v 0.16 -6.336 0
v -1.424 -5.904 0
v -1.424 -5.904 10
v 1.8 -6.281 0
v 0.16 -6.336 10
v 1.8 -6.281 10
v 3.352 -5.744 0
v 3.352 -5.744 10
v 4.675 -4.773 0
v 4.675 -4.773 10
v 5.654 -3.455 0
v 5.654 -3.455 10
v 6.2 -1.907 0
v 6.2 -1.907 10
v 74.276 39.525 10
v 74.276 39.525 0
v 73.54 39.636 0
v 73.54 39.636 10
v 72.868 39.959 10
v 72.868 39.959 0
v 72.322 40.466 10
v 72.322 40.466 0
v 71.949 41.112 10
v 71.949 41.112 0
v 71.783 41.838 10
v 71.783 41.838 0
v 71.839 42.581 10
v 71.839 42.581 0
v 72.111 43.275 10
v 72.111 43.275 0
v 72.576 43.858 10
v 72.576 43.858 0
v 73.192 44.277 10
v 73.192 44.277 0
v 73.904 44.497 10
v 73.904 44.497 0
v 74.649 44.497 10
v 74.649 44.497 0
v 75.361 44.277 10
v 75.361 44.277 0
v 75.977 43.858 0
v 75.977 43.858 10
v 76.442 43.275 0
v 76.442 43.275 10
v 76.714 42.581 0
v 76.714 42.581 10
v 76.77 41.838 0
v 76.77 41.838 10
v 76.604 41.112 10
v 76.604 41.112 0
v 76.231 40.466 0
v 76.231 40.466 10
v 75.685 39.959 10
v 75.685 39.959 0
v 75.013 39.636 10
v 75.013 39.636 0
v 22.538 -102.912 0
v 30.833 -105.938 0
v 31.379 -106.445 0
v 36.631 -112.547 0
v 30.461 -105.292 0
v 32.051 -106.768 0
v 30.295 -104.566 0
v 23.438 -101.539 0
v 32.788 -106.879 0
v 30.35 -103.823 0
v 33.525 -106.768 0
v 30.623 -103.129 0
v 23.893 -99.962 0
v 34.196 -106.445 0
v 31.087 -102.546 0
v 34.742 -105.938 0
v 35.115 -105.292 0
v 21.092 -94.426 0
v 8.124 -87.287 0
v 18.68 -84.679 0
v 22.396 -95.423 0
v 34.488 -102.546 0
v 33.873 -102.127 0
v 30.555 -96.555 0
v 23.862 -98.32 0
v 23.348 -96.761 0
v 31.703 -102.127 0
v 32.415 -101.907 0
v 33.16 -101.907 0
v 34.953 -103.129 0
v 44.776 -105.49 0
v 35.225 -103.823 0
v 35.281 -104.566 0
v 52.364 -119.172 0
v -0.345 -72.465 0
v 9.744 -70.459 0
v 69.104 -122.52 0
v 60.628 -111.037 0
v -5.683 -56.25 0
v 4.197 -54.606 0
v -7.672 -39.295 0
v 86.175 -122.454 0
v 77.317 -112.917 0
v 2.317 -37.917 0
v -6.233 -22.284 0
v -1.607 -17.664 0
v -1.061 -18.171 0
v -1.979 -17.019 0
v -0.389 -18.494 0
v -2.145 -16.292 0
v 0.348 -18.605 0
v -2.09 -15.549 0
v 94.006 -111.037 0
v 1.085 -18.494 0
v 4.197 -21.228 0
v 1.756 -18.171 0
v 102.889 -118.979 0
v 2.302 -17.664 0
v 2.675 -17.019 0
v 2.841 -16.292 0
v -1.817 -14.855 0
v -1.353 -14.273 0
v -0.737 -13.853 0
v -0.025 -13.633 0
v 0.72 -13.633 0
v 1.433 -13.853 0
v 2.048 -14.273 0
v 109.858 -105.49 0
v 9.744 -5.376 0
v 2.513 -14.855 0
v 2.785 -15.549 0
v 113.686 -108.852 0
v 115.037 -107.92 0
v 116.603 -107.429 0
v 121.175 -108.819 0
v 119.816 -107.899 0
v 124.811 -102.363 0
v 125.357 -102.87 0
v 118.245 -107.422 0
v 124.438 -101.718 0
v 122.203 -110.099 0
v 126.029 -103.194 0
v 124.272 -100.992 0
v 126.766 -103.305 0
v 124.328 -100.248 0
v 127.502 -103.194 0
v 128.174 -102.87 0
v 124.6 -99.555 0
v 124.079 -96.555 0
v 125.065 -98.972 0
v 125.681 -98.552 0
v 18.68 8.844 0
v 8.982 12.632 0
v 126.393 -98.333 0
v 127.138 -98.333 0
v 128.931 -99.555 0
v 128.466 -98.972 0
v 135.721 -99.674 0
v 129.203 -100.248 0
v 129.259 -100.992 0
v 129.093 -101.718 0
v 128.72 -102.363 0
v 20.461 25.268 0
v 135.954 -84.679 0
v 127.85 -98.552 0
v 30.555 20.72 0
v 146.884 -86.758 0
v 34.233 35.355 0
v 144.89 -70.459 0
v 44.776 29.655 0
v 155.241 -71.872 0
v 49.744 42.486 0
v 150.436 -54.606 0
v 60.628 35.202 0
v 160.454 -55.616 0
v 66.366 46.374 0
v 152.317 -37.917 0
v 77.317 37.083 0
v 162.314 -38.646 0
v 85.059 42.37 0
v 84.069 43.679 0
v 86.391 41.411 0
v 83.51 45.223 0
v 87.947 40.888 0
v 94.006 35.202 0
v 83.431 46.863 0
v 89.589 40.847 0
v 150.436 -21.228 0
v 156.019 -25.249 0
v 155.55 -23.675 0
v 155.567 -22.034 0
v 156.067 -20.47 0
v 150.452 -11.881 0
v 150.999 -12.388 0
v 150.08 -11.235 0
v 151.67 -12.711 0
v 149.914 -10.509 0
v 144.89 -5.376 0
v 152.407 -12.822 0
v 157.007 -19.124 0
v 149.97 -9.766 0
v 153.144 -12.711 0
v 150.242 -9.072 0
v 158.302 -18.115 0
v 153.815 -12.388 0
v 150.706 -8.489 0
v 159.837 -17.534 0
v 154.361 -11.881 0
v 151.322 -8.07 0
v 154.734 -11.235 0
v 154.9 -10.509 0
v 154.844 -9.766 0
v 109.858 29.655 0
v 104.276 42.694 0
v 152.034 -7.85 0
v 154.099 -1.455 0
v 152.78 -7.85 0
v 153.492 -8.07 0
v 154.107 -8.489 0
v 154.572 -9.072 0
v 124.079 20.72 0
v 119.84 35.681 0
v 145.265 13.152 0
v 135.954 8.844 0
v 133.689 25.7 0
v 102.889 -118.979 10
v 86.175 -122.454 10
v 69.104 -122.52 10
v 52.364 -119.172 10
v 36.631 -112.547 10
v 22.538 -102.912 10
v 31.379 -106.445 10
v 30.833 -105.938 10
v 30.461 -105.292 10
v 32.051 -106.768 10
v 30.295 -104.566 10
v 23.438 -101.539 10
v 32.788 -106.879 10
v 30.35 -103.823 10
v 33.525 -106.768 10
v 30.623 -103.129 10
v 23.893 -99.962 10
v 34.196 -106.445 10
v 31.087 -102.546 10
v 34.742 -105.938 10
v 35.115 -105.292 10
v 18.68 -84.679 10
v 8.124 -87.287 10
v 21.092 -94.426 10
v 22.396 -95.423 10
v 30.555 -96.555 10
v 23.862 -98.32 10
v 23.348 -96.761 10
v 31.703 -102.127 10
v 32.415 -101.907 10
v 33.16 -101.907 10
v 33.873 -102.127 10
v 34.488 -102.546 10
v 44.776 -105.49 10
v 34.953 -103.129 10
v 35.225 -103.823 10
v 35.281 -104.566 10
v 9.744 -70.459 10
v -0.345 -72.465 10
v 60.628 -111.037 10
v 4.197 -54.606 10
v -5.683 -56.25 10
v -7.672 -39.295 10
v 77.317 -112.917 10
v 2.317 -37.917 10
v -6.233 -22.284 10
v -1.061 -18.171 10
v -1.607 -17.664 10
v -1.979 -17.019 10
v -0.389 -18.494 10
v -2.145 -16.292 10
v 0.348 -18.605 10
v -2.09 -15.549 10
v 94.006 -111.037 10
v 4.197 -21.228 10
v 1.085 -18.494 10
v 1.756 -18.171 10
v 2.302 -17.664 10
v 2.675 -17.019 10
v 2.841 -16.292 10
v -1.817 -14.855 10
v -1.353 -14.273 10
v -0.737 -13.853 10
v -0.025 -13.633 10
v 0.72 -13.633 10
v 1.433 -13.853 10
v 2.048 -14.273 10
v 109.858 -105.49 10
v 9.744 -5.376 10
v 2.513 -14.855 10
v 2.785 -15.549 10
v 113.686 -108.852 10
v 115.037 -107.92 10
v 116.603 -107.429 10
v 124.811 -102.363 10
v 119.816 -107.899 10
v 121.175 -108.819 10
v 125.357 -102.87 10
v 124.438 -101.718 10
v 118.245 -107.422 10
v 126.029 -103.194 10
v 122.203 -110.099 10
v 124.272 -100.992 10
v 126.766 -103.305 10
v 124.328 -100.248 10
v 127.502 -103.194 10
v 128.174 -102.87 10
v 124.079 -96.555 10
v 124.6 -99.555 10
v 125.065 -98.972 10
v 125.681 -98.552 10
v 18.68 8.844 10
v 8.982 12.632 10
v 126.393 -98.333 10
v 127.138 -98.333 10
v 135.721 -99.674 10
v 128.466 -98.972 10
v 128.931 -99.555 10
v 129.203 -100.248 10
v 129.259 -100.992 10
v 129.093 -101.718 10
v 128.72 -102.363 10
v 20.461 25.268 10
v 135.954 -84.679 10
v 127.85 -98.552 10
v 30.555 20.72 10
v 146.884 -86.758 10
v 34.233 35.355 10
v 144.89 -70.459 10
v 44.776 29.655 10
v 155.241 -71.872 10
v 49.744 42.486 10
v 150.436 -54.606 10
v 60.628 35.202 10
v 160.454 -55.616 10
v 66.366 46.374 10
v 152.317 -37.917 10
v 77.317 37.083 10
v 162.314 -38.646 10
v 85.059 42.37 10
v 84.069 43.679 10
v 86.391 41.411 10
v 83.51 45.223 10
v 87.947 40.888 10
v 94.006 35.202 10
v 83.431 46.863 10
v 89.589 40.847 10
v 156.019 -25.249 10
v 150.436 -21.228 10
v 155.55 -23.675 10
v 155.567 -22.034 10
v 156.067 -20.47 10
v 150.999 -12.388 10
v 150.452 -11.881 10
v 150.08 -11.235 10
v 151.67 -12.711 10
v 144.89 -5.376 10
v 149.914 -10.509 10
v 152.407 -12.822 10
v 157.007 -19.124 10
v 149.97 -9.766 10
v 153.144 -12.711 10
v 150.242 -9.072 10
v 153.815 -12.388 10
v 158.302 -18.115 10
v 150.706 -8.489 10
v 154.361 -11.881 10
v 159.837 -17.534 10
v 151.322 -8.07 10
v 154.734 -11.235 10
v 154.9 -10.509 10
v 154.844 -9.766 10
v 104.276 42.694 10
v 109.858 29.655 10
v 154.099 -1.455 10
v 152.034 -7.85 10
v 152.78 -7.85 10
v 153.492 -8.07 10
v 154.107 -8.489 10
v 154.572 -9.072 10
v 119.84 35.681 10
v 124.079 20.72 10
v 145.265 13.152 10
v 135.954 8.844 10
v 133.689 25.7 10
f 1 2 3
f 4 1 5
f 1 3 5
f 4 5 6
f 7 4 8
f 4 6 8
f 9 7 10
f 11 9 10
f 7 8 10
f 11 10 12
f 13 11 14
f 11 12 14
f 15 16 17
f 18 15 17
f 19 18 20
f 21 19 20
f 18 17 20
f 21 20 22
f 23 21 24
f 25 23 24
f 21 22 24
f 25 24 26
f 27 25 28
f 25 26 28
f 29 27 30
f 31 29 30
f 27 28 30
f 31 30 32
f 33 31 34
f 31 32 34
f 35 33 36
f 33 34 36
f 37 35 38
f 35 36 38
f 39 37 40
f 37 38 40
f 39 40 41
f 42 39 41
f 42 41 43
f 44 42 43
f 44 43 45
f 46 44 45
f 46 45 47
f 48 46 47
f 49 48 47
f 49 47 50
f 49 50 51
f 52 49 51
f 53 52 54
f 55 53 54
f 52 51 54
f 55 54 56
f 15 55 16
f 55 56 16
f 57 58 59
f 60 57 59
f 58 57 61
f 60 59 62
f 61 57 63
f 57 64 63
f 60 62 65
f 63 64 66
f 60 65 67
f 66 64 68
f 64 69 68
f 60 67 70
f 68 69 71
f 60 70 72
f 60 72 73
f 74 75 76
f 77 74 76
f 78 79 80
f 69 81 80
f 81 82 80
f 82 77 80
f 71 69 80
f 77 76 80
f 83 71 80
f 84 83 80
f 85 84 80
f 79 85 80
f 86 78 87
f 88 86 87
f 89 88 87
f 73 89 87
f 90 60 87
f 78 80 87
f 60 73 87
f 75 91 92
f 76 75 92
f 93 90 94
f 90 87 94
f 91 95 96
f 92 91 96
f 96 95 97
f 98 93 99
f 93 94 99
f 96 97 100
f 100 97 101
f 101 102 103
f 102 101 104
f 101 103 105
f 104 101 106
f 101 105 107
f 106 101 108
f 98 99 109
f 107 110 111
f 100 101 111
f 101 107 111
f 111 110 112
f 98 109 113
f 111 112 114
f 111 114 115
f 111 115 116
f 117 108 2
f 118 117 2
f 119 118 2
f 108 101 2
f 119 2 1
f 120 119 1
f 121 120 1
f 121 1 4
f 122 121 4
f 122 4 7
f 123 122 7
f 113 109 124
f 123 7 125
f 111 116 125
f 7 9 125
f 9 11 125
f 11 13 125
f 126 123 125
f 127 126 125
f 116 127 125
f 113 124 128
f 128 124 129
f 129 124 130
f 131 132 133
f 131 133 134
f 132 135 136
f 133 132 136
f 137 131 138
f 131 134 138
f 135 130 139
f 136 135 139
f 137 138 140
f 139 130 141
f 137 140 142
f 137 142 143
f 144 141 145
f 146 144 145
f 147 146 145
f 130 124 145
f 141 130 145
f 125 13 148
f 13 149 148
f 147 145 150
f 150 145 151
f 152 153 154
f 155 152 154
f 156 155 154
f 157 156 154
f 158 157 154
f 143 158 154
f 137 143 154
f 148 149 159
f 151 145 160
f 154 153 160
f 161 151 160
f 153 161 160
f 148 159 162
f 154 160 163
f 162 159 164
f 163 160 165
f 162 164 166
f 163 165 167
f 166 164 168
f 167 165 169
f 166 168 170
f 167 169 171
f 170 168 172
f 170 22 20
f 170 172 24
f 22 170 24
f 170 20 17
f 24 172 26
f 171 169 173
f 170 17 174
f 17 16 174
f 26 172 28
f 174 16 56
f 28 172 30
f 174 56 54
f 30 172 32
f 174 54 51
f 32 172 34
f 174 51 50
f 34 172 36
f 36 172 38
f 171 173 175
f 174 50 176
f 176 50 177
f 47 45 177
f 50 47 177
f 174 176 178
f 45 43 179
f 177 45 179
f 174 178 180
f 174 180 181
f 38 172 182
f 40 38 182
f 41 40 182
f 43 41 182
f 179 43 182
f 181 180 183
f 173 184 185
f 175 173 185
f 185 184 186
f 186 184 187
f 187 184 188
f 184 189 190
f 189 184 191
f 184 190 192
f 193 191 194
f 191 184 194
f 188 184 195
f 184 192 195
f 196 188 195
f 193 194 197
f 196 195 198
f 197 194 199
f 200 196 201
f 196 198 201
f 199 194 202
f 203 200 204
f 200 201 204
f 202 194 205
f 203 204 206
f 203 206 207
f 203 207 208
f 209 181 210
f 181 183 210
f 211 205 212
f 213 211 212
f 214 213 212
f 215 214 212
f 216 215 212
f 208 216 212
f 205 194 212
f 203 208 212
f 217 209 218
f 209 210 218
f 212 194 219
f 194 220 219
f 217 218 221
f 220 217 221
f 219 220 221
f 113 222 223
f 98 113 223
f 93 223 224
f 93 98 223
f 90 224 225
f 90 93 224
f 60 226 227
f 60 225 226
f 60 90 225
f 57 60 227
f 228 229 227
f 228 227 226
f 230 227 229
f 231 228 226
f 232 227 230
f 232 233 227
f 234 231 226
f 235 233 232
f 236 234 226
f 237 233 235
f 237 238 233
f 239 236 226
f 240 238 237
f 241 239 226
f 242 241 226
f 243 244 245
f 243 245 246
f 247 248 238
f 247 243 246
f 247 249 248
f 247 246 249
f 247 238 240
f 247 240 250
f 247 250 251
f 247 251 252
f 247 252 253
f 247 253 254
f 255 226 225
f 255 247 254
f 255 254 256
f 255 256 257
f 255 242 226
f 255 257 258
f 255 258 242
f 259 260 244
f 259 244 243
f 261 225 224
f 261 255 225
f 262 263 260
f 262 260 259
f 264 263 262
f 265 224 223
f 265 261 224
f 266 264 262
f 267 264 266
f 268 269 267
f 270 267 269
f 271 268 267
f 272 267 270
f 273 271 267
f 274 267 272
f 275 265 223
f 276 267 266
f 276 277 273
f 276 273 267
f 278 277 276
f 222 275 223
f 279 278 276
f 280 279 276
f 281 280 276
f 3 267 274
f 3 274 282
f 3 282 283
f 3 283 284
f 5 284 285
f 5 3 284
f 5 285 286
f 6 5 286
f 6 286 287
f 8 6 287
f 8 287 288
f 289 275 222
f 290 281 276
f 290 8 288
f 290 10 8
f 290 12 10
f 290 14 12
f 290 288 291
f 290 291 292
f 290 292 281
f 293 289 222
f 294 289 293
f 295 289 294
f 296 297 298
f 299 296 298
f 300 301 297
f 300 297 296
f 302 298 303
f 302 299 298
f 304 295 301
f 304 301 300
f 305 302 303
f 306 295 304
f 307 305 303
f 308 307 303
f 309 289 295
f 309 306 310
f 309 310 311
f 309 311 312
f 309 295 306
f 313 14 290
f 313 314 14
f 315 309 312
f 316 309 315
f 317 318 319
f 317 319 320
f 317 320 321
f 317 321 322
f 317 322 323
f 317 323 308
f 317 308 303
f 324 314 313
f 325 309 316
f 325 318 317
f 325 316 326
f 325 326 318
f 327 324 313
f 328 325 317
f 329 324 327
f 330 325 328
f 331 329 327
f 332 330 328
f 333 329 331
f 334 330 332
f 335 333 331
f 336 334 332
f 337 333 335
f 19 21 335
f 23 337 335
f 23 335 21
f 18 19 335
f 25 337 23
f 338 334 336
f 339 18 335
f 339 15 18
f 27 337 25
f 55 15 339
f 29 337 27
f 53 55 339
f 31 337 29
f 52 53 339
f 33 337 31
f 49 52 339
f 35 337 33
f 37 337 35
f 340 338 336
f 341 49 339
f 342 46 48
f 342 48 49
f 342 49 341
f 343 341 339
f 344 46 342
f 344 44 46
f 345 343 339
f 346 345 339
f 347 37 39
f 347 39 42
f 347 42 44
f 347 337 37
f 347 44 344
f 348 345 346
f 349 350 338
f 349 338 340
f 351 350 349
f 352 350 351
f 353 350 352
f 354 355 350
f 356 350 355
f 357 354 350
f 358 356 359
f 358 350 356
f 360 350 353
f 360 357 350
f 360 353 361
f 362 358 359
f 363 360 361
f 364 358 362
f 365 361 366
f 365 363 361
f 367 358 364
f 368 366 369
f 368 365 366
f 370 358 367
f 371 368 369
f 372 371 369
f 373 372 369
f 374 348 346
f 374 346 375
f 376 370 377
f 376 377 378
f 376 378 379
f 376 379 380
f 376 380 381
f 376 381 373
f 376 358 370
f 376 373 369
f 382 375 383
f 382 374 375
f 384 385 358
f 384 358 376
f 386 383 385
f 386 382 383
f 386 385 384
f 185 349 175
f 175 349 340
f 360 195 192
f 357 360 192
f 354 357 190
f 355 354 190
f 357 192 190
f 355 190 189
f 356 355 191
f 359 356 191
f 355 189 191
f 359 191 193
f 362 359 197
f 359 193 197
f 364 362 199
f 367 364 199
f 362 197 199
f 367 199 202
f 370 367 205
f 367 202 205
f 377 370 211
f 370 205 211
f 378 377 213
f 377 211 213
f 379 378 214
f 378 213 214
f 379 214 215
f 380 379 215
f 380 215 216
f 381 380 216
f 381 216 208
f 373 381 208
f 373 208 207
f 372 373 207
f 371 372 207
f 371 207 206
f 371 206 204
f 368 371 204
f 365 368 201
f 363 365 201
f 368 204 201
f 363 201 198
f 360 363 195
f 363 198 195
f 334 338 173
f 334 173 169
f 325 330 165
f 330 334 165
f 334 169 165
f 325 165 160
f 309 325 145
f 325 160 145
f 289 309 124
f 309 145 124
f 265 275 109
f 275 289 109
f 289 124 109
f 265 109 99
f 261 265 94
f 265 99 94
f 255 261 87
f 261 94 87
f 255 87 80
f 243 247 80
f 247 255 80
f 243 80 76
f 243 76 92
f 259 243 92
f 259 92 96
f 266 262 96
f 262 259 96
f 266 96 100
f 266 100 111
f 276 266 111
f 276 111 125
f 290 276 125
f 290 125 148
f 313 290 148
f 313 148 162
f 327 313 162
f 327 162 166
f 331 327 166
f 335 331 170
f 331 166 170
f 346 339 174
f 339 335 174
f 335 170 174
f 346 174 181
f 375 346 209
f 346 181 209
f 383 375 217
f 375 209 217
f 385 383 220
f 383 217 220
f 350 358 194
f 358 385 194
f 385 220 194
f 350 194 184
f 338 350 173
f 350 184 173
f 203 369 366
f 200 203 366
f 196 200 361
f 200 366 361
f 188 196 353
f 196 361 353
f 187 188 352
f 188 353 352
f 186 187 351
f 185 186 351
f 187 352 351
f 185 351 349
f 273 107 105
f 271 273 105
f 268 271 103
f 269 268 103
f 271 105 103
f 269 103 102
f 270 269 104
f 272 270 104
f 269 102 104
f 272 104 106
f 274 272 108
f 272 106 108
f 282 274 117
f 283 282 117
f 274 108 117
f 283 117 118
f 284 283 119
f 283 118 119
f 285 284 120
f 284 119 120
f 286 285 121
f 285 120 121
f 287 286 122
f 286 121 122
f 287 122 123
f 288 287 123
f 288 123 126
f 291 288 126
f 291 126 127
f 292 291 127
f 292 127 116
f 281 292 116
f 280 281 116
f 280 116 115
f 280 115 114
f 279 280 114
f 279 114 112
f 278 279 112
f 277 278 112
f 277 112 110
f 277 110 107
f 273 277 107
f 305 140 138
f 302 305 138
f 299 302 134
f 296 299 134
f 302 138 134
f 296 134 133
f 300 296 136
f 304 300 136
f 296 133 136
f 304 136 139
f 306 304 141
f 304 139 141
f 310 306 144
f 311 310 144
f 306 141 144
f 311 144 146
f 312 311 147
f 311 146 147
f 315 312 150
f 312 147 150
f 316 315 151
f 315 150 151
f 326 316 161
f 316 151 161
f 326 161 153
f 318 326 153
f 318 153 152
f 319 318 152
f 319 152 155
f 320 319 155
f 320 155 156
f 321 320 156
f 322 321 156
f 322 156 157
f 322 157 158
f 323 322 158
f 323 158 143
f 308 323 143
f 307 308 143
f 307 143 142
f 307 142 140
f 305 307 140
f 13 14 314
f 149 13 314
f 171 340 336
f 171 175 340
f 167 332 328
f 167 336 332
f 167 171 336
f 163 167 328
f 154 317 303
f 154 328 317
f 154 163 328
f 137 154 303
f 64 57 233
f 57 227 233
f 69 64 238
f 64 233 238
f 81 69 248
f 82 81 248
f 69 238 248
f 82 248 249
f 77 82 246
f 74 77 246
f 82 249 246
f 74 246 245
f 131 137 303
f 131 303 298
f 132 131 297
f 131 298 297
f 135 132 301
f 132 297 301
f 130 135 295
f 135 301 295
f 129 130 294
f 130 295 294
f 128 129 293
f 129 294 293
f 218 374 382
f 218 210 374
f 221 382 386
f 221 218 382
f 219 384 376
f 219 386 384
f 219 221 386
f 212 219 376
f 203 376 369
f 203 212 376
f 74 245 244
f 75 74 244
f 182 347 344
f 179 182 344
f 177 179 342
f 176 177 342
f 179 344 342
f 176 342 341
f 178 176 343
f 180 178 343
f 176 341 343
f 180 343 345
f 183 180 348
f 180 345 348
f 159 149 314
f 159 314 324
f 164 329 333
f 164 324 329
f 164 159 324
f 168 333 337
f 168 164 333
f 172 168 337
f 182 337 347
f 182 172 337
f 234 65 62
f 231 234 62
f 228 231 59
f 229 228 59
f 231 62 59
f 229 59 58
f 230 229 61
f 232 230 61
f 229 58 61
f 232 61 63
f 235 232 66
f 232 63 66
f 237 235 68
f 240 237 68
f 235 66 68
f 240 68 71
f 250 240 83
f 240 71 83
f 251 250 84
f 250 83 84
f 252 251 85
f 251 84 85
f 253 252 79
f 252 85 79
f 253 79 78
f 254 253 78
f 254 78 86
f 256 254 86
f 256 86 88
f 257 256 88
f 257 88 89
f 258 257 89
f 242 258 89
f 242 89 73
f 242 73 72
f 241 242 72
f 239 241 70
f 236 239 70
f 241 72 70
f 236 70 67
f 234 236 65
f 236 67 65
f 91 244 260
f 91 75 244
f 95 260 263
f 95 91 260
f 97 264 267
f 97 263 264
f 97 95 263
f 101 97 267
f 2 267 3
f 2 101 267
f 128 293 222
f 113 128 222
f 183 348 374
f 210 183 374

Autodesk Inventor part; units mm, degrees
ref_plane "YZ Plane" through (0, 0, 0) normal (1, 0, 0) x (0, 1, 0)
ref_plane "XZ Plane" through (0, 0, 0) normal (0, 1, 0) x (-1, 0, 0)
ref_plane "XY Plane" through (0, 0, 0) normal (0, 0, 1) x (1, 0, 0)
sketch "Sketch1" plane through (0, 0, 0) normal (0, 0, 1) x (1, 0, 0)
  circle A0 centre (77.3169, -37.9173) radius 75
  circle A1 centre (77.3169, -37.9173) radius 85
  circle A2 centre (77.3169, -37.9173) radius 75 projected
  point P0 (0, 0)
  dimension "d0" = 150
  dimension "d1" = 170
extrude "Extrusion1" add sketch "Sketch1" along normal blind 10
sketch "Sketch3" plane through (77.3169, -37.9173, 10) normal (0, 0, 1) x (1, 0, 0)
  circle A0 centre (-76.5194, 37.0443) radius 2.5 construction
  circle A1 centre (-58.877, -61.3269) radius 2.5 construction
  circle A2 centre (40.1314, -74.9464) radius 2.5 construction
  circle A3 centre (83.6796, 15.0075) radius 2.5 construction
  circle A4 centre (11.5854, 84.2216) radius 2.5 construction
  line L0 (40.1314, -74.9464) -> (25.5443, -88.6291) construction
  line L1 (36.3686, -70.935) -> (21.7815, -84.6177)
  line L2 (29.307, -92.6406) -> (43.8941, -78.9579)
  arc A5 (43.8941, -78.9579) -> (36.3686, -70.935) centre (40.1314, -74.9464) ccw
  arc A6 (21.7815, -84.6177) -> (29.307, -92.6406) centre (25.5443, -88.6291) ccw
  line L3 (40.1314, -74.9464) -> (48.951, -91.4173) construction
  circle A7 centre (0, 0) radius 85 construction
  line L4 (78.7017, 12.6685) -> (87.207, -5.4328)
  line L5 (97.1628, -0.7549) -> (88.6574, 17.3465)
  arc A8 (88.6574, 17.3465) -> (78.7017, 12.6685) centre (83.6796, 15.0075) ccw
  arc A9 (87.207, -5.4328) -> (97.1628, -0.7549) centre (92.1849, -3.0939) ccw
  line L6 (12.2717, 78.7645) -> (32.1154, 81.26)
  line L7 (30.7429, 92.174) -> (10.8992, 89.6786)
  arc A10 (10.8992, 89.6786) -> (12.2717, 78.7645) centre (11.5854, 84.2216) ccw
  arc A11 (32.1154, 81.26) -> (30.7429, 92.174) centre (31.4292, 86.717) ccw
  line L8 (-71.1174, 36.0107) -> (-67.3586, 55.6543)
  line L9 (-78.1626, 57.7216) -> (-81.9214, 38.078)
  arc A12 (-81.9214, 38.078) -> (-71.1174, 36.0107) centre (-76.5194, 37.0443) ccw
  arc A13 (-67.3586, 55.6543) -> (-78.1626, 57.7216) centre (-72.7606, 56.6879) ccw
  line L10 (-56.2246, -56.5087) -> (-73.7453, -46.8638)
  line L11 (-79.0501, -56.5001) -> (-61.5294, -66.1451)
  arc A14 (-61.5294, -66.1451) -> (-56.2246, -56.5087) centre (-58.877, -61.3269) ccw
  arc A15 (-73.7453, -46.8638) -> (-79.0501, -56.5001) centre (-76.3977, -51.6819) ccw
  point P0 (-77.3169, 37.9173)
  point P1 (32.8378, -81.7878)
  dimension "d22" = 11
  dimension "d23" = 75
  dimension "d24" = 20
  dimension "d27" = 360
extrude "Extrusion5" cut sketch "Sketch3" against normal blind 10
sketch "Sketch4" plane through (0, 0, 10) normal (0, 0, 1) x (1, 0, 0)
  circle A0 centre (0.3478, -16.1054) radius 2.5 projected
  circle A1 centre (32.7878, -104.379) radius 2.5 projected
  circle A2 centre (126.7655, -100.8047) radius 2.5 projected
  circle A3 centre (152.4069, -10.3221) radius 2.5 projected
  circle A4 centre (74.2765, 42.0249) radius 2.5 projected
  point P0 (0, 0)
hole "Hole1" at (32.7878, -104.379, 10) at (126.7655, -100.8047, 10) at (152.4069, -10.3221, 10) at (74.2765, 42.0249, 10) at (0.3478, -16.1054, 10) direction (0, 0, -1) diameter 5 end through all
properties part number "innerring"
